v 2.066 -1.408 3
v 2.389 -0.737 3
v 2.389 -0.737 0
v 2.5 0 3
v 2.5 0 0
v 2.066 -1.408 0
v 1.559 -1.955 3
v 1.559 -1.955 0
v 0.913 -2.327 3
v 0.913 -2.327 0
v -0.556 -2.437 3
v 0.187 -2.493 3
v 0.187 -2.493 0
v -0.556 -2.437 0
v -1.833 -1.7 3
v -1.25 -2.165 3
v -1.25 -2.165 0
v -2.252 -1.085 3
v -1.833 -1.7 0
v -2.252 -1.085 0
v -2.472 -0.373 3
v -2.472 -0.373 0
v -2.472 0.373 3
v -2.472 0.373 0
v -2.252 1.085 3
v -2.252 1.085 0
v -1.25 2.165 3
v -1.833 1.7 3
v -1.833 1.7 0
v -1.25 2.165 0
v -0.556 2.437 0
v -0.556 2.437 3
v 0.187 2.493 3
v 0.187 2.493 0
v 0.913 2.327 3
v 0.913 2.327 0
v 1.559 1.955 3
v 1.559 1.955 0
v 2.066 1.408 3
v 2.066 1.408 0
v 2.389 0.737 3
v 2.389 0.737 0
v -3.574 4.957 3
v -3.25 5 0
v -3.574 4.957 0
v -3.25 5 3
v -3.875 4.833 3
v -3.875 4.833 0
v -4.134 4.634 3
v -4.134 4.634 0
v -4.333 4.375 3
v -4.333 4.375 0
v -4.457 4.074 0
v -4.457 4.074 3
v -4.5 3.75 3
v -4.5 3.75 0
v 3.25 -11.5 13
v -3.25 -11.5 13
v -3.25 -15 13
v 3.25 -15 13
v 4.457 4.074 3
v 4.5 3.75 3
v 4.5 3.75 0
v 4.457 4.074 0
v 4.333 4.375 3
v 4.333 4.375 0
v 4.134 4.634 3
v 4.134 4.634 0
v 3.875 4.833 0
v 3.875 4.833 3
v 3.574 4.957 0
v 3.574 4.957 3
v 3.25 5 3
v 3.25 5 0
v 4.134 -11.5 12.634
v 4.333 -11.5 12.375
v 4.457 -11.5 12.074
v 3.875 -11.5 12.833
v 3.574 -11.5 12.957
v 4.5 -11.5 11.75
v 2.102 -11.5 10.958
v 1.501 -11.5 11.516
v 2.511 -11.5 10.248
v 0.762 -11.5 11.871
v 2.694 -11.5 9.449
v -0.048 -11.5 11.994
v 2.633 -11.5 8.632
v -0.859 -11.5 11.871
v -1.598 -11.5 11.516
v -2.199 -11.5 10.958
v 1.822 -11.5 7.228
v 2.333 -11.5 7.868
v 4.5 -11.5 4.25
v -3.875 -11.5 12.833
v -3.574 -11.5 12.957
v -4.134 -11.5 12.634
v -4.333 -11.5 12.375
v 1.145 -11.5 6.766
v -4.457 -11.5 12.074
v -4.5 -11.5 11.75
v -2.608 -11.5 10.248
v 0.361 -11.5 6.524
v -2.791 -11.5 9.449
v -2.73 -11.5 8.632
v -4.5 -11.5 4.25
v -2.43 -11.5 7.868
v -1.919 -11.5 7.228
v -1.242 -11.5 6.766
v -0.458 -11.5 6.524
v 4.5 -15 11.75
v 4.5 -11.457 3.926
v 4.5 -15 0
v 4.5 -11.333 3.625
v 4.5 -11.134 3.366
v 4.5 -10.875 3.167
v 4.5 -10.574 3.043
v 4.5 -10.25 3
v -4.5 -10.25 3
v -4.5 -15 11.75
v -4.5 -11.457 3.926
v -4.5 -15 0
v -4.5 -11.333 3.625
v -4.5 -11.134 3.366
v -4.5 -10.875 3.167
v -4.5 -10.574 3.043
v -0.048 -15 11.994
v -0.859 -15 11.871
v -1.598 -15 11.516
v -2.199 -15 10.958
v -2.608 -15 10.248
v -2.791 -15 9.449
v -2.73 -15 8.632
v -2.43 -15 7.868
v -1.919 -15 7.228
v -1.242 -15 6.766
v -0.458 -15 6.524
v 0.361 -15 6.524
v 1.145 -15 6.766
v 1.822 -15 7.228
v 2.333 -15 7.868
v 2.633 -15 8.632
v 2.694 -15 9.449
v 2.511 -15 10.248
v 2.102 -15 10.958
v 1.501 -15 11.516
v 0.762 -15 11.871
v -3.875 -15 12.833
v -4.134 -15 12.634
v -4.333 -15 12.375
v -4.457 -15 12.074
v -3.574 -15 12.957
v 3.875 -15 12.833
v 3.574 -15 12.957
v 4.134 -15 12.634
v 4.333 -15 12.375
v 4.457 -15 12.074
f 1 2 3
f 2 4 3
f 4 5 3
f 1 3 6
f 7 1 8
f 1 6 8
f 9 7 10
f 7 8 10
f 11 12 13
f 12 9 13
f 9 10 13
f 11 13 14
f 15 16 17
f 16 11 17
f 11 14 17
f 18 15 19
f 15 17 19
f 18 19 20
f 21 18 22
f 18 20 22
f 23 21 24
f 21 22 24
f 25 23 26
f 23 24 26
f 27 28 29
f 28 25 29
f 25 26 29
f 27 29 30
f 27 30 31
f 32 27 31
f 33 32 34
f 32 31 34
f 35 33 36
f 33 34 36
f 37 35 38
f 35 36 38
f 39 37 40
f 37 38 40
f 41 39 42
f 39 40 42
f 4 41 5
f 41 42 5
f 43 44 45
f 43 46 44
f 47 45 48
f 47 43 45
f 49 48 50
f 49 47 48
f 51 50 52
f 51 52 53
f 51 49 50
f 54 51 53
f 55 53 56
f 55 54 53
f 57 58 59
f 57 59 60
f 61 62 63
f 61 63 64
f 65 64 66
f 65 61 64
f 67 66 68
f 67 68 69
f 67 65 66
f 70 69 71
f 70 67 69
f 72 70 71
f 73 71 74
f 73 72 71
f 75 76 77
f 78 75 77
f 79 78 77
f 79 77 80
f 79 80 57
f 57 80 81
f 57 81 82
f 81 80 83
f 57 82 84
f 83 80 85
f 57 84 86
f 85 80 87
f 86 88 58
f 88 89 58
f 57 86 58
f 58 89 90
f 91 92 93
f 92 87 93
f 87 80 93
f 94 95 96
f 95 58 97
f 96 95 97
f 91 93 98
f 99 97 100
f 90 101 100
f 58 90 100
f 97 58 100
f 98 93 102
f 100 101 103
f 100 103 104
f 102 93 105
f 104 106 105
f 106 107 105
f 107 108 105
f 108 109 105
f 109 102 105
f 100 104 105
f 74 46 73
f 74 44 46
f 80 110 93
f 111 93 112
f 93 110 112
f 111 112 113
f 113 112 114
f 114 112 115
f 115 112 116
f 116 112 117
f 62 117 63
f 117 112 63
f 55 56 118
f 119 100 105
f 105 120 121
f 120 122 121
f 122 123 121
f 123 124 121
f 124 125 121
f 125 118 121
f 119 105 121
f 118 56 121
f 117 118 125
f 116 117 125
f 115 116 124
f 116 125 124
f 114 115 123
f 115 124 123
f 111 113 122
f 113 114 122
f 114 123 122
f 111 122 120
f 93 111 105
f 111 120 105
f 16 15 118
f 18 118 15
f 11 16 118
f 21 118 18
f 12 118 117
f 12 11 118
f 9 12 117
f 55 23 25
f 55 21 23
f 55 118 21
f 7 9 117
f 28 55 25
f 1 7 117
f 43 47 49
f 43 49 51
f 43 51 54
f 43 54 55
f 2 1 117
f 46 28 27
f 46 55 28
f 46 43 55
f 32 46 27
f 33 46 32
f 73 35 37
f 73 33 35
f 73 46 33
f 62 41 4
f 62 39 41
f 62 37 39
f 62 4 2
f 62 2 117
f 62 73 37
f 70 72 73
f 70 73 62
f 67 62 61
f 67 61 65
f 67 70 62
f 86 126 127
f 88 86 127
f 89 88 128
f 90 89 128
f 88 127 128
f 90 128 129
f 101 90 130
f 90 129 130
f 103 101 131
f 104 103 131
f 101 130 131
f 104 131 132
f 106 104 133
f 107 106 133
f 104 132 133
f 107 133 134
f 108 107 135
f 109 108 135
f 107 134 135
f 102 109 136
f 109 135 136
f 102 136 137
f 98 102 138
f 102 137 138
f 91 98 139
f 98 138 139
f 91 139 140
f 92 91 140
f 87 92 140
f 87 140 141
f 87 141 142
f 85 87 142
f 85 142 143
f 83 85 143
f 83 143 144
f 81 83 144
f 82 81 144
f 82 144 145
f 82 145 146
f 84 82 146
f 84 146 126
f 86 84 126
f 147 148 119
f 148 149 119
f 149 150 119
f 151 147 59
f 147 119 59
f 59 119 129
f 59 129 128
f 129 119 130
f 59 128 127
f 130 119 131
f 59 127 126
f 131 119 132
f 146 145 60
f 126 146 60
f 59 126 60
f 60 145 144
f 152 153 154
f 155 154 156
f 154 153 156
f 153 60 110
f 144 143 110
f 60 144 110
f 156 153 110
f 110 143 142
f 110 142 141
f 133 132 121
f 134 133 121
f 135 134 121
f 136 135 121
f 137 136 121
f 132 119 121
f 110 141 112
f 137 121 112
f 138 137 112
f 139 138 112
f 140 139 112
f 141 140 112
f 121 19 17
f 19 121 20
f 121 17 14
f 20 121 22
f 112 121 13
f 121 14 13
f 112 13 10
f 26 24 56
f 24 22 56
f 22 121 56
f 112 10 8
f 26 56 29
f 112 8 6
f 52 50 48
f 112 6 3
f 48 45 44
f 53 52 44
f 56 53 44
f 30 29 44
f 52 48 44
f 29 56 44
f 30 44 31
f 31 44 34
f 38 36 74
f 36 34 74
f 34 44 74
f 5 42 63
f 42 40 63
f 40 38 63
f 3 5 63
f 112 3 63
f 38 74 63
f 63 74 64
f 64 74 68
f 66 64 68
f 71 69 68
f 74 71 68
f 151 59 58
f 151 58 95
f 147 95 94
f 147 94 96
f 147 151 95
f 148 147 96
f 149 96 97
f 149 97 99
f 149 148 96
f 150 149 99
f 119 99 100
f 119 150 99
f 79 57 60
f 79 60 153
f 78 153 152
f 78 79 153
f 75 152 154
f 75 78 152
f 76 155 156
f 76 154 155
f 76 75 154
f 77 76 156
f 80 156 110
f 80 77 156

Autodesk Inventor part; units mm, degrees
ref_plane "YZ Plane" through (0, 0, 0) normal (1, 0, 0) x (0, 1, 0)
ref_plane "XZ Plane" through (0, 0, 0) normal (0, 1, 0) x (-1, 0, 0)
ref_plane "XY Plane" through (0, 0, 0) normal (0, 0, 1) x (1, 0, 0)
sketch "Sketch1" plane through (0, 0, 0) normal (0, 0, 1) x (1, 0, 0)
  circle A0 centre (0, 0) radius 2.5
  line L0 (-4.5, 5) -> (4.5, 5)
  line L1 (4.5, 5) -> (4.5, -11.5)
  line L2 (4.5, -11.5) -> (-4.5, -11.5)
  line L3 (-4.5, -11.5) -> (-4.5, 5)
  line L4 (-4.5, -11.5) -> (4.5, -11.5)
  line L5 (4.5, -11.5) -> (4.5, -15)
  line L6 (4.5, -15) -> (-4.5, -15)
  line L7 (-4.5, -15) -> (-4.5, -11.5)
  dimension "d0" = 5
  dimension "d1" = 4.5
  dimension "d2" = 4.5
  dimension "d3" = 5
  dimension "d4" = 11.5
  dimension "d5" = 3.5
extrude "Extrusion1" add sketch "Sketch1" along normal blind 3
sketch "Sketch2" plane through (0, 0, 3) normal (0, 0, 1) x (1, 0, 0)
  line L0 (4.5, 5) -> (-4.5, 5) projected
  line L1 (-4.5, 5) -> (-4.5, -15) projected
  line L2 (-4.5, -15) -> (4.5, -15) projected
  line L3 (4.5, -15) -> (4.5, 5) projected
  circle A0 centre (0, 0) radius 2.5 projected
  line L4 (-4.5, -15) -> (4.5, -15)
  line L5 (4.5, -15) -> (4.5, -11.5)
  line L6 (4.5, -11.5) -> (-4.5, -11.5)
  line L7 (-4.5, -11.5) -> (-4.5, -15)
  dimension "d8" = 3.5
extrude "Extrusion2" add sketch "Sketch2" along normal blind 10 contours L3 L2 L1 L6
sketch "Sketch3" plane through (-4.5, -11.5, 3) normal (0, 1, 0) x (1, 0, 0)
  point P0 (4.5, 3)
  point P1 (4.4515, -6.2435)
hole "Hole1" at (-0.0485, -11.5, 9.2435) direction (0, -1, 0) diameter 5.5 depth 4 tip angle 118
fillet "Fillet1" radius 1.25 5 edges at (4.5, -13.25, 13) (-4.5, -13.25, 13) (0, -11.5, 3) (4.5, 5, 1.5) (-4.5, 5, 1.5)
properties part number "driver-bracket_3DPrint"
